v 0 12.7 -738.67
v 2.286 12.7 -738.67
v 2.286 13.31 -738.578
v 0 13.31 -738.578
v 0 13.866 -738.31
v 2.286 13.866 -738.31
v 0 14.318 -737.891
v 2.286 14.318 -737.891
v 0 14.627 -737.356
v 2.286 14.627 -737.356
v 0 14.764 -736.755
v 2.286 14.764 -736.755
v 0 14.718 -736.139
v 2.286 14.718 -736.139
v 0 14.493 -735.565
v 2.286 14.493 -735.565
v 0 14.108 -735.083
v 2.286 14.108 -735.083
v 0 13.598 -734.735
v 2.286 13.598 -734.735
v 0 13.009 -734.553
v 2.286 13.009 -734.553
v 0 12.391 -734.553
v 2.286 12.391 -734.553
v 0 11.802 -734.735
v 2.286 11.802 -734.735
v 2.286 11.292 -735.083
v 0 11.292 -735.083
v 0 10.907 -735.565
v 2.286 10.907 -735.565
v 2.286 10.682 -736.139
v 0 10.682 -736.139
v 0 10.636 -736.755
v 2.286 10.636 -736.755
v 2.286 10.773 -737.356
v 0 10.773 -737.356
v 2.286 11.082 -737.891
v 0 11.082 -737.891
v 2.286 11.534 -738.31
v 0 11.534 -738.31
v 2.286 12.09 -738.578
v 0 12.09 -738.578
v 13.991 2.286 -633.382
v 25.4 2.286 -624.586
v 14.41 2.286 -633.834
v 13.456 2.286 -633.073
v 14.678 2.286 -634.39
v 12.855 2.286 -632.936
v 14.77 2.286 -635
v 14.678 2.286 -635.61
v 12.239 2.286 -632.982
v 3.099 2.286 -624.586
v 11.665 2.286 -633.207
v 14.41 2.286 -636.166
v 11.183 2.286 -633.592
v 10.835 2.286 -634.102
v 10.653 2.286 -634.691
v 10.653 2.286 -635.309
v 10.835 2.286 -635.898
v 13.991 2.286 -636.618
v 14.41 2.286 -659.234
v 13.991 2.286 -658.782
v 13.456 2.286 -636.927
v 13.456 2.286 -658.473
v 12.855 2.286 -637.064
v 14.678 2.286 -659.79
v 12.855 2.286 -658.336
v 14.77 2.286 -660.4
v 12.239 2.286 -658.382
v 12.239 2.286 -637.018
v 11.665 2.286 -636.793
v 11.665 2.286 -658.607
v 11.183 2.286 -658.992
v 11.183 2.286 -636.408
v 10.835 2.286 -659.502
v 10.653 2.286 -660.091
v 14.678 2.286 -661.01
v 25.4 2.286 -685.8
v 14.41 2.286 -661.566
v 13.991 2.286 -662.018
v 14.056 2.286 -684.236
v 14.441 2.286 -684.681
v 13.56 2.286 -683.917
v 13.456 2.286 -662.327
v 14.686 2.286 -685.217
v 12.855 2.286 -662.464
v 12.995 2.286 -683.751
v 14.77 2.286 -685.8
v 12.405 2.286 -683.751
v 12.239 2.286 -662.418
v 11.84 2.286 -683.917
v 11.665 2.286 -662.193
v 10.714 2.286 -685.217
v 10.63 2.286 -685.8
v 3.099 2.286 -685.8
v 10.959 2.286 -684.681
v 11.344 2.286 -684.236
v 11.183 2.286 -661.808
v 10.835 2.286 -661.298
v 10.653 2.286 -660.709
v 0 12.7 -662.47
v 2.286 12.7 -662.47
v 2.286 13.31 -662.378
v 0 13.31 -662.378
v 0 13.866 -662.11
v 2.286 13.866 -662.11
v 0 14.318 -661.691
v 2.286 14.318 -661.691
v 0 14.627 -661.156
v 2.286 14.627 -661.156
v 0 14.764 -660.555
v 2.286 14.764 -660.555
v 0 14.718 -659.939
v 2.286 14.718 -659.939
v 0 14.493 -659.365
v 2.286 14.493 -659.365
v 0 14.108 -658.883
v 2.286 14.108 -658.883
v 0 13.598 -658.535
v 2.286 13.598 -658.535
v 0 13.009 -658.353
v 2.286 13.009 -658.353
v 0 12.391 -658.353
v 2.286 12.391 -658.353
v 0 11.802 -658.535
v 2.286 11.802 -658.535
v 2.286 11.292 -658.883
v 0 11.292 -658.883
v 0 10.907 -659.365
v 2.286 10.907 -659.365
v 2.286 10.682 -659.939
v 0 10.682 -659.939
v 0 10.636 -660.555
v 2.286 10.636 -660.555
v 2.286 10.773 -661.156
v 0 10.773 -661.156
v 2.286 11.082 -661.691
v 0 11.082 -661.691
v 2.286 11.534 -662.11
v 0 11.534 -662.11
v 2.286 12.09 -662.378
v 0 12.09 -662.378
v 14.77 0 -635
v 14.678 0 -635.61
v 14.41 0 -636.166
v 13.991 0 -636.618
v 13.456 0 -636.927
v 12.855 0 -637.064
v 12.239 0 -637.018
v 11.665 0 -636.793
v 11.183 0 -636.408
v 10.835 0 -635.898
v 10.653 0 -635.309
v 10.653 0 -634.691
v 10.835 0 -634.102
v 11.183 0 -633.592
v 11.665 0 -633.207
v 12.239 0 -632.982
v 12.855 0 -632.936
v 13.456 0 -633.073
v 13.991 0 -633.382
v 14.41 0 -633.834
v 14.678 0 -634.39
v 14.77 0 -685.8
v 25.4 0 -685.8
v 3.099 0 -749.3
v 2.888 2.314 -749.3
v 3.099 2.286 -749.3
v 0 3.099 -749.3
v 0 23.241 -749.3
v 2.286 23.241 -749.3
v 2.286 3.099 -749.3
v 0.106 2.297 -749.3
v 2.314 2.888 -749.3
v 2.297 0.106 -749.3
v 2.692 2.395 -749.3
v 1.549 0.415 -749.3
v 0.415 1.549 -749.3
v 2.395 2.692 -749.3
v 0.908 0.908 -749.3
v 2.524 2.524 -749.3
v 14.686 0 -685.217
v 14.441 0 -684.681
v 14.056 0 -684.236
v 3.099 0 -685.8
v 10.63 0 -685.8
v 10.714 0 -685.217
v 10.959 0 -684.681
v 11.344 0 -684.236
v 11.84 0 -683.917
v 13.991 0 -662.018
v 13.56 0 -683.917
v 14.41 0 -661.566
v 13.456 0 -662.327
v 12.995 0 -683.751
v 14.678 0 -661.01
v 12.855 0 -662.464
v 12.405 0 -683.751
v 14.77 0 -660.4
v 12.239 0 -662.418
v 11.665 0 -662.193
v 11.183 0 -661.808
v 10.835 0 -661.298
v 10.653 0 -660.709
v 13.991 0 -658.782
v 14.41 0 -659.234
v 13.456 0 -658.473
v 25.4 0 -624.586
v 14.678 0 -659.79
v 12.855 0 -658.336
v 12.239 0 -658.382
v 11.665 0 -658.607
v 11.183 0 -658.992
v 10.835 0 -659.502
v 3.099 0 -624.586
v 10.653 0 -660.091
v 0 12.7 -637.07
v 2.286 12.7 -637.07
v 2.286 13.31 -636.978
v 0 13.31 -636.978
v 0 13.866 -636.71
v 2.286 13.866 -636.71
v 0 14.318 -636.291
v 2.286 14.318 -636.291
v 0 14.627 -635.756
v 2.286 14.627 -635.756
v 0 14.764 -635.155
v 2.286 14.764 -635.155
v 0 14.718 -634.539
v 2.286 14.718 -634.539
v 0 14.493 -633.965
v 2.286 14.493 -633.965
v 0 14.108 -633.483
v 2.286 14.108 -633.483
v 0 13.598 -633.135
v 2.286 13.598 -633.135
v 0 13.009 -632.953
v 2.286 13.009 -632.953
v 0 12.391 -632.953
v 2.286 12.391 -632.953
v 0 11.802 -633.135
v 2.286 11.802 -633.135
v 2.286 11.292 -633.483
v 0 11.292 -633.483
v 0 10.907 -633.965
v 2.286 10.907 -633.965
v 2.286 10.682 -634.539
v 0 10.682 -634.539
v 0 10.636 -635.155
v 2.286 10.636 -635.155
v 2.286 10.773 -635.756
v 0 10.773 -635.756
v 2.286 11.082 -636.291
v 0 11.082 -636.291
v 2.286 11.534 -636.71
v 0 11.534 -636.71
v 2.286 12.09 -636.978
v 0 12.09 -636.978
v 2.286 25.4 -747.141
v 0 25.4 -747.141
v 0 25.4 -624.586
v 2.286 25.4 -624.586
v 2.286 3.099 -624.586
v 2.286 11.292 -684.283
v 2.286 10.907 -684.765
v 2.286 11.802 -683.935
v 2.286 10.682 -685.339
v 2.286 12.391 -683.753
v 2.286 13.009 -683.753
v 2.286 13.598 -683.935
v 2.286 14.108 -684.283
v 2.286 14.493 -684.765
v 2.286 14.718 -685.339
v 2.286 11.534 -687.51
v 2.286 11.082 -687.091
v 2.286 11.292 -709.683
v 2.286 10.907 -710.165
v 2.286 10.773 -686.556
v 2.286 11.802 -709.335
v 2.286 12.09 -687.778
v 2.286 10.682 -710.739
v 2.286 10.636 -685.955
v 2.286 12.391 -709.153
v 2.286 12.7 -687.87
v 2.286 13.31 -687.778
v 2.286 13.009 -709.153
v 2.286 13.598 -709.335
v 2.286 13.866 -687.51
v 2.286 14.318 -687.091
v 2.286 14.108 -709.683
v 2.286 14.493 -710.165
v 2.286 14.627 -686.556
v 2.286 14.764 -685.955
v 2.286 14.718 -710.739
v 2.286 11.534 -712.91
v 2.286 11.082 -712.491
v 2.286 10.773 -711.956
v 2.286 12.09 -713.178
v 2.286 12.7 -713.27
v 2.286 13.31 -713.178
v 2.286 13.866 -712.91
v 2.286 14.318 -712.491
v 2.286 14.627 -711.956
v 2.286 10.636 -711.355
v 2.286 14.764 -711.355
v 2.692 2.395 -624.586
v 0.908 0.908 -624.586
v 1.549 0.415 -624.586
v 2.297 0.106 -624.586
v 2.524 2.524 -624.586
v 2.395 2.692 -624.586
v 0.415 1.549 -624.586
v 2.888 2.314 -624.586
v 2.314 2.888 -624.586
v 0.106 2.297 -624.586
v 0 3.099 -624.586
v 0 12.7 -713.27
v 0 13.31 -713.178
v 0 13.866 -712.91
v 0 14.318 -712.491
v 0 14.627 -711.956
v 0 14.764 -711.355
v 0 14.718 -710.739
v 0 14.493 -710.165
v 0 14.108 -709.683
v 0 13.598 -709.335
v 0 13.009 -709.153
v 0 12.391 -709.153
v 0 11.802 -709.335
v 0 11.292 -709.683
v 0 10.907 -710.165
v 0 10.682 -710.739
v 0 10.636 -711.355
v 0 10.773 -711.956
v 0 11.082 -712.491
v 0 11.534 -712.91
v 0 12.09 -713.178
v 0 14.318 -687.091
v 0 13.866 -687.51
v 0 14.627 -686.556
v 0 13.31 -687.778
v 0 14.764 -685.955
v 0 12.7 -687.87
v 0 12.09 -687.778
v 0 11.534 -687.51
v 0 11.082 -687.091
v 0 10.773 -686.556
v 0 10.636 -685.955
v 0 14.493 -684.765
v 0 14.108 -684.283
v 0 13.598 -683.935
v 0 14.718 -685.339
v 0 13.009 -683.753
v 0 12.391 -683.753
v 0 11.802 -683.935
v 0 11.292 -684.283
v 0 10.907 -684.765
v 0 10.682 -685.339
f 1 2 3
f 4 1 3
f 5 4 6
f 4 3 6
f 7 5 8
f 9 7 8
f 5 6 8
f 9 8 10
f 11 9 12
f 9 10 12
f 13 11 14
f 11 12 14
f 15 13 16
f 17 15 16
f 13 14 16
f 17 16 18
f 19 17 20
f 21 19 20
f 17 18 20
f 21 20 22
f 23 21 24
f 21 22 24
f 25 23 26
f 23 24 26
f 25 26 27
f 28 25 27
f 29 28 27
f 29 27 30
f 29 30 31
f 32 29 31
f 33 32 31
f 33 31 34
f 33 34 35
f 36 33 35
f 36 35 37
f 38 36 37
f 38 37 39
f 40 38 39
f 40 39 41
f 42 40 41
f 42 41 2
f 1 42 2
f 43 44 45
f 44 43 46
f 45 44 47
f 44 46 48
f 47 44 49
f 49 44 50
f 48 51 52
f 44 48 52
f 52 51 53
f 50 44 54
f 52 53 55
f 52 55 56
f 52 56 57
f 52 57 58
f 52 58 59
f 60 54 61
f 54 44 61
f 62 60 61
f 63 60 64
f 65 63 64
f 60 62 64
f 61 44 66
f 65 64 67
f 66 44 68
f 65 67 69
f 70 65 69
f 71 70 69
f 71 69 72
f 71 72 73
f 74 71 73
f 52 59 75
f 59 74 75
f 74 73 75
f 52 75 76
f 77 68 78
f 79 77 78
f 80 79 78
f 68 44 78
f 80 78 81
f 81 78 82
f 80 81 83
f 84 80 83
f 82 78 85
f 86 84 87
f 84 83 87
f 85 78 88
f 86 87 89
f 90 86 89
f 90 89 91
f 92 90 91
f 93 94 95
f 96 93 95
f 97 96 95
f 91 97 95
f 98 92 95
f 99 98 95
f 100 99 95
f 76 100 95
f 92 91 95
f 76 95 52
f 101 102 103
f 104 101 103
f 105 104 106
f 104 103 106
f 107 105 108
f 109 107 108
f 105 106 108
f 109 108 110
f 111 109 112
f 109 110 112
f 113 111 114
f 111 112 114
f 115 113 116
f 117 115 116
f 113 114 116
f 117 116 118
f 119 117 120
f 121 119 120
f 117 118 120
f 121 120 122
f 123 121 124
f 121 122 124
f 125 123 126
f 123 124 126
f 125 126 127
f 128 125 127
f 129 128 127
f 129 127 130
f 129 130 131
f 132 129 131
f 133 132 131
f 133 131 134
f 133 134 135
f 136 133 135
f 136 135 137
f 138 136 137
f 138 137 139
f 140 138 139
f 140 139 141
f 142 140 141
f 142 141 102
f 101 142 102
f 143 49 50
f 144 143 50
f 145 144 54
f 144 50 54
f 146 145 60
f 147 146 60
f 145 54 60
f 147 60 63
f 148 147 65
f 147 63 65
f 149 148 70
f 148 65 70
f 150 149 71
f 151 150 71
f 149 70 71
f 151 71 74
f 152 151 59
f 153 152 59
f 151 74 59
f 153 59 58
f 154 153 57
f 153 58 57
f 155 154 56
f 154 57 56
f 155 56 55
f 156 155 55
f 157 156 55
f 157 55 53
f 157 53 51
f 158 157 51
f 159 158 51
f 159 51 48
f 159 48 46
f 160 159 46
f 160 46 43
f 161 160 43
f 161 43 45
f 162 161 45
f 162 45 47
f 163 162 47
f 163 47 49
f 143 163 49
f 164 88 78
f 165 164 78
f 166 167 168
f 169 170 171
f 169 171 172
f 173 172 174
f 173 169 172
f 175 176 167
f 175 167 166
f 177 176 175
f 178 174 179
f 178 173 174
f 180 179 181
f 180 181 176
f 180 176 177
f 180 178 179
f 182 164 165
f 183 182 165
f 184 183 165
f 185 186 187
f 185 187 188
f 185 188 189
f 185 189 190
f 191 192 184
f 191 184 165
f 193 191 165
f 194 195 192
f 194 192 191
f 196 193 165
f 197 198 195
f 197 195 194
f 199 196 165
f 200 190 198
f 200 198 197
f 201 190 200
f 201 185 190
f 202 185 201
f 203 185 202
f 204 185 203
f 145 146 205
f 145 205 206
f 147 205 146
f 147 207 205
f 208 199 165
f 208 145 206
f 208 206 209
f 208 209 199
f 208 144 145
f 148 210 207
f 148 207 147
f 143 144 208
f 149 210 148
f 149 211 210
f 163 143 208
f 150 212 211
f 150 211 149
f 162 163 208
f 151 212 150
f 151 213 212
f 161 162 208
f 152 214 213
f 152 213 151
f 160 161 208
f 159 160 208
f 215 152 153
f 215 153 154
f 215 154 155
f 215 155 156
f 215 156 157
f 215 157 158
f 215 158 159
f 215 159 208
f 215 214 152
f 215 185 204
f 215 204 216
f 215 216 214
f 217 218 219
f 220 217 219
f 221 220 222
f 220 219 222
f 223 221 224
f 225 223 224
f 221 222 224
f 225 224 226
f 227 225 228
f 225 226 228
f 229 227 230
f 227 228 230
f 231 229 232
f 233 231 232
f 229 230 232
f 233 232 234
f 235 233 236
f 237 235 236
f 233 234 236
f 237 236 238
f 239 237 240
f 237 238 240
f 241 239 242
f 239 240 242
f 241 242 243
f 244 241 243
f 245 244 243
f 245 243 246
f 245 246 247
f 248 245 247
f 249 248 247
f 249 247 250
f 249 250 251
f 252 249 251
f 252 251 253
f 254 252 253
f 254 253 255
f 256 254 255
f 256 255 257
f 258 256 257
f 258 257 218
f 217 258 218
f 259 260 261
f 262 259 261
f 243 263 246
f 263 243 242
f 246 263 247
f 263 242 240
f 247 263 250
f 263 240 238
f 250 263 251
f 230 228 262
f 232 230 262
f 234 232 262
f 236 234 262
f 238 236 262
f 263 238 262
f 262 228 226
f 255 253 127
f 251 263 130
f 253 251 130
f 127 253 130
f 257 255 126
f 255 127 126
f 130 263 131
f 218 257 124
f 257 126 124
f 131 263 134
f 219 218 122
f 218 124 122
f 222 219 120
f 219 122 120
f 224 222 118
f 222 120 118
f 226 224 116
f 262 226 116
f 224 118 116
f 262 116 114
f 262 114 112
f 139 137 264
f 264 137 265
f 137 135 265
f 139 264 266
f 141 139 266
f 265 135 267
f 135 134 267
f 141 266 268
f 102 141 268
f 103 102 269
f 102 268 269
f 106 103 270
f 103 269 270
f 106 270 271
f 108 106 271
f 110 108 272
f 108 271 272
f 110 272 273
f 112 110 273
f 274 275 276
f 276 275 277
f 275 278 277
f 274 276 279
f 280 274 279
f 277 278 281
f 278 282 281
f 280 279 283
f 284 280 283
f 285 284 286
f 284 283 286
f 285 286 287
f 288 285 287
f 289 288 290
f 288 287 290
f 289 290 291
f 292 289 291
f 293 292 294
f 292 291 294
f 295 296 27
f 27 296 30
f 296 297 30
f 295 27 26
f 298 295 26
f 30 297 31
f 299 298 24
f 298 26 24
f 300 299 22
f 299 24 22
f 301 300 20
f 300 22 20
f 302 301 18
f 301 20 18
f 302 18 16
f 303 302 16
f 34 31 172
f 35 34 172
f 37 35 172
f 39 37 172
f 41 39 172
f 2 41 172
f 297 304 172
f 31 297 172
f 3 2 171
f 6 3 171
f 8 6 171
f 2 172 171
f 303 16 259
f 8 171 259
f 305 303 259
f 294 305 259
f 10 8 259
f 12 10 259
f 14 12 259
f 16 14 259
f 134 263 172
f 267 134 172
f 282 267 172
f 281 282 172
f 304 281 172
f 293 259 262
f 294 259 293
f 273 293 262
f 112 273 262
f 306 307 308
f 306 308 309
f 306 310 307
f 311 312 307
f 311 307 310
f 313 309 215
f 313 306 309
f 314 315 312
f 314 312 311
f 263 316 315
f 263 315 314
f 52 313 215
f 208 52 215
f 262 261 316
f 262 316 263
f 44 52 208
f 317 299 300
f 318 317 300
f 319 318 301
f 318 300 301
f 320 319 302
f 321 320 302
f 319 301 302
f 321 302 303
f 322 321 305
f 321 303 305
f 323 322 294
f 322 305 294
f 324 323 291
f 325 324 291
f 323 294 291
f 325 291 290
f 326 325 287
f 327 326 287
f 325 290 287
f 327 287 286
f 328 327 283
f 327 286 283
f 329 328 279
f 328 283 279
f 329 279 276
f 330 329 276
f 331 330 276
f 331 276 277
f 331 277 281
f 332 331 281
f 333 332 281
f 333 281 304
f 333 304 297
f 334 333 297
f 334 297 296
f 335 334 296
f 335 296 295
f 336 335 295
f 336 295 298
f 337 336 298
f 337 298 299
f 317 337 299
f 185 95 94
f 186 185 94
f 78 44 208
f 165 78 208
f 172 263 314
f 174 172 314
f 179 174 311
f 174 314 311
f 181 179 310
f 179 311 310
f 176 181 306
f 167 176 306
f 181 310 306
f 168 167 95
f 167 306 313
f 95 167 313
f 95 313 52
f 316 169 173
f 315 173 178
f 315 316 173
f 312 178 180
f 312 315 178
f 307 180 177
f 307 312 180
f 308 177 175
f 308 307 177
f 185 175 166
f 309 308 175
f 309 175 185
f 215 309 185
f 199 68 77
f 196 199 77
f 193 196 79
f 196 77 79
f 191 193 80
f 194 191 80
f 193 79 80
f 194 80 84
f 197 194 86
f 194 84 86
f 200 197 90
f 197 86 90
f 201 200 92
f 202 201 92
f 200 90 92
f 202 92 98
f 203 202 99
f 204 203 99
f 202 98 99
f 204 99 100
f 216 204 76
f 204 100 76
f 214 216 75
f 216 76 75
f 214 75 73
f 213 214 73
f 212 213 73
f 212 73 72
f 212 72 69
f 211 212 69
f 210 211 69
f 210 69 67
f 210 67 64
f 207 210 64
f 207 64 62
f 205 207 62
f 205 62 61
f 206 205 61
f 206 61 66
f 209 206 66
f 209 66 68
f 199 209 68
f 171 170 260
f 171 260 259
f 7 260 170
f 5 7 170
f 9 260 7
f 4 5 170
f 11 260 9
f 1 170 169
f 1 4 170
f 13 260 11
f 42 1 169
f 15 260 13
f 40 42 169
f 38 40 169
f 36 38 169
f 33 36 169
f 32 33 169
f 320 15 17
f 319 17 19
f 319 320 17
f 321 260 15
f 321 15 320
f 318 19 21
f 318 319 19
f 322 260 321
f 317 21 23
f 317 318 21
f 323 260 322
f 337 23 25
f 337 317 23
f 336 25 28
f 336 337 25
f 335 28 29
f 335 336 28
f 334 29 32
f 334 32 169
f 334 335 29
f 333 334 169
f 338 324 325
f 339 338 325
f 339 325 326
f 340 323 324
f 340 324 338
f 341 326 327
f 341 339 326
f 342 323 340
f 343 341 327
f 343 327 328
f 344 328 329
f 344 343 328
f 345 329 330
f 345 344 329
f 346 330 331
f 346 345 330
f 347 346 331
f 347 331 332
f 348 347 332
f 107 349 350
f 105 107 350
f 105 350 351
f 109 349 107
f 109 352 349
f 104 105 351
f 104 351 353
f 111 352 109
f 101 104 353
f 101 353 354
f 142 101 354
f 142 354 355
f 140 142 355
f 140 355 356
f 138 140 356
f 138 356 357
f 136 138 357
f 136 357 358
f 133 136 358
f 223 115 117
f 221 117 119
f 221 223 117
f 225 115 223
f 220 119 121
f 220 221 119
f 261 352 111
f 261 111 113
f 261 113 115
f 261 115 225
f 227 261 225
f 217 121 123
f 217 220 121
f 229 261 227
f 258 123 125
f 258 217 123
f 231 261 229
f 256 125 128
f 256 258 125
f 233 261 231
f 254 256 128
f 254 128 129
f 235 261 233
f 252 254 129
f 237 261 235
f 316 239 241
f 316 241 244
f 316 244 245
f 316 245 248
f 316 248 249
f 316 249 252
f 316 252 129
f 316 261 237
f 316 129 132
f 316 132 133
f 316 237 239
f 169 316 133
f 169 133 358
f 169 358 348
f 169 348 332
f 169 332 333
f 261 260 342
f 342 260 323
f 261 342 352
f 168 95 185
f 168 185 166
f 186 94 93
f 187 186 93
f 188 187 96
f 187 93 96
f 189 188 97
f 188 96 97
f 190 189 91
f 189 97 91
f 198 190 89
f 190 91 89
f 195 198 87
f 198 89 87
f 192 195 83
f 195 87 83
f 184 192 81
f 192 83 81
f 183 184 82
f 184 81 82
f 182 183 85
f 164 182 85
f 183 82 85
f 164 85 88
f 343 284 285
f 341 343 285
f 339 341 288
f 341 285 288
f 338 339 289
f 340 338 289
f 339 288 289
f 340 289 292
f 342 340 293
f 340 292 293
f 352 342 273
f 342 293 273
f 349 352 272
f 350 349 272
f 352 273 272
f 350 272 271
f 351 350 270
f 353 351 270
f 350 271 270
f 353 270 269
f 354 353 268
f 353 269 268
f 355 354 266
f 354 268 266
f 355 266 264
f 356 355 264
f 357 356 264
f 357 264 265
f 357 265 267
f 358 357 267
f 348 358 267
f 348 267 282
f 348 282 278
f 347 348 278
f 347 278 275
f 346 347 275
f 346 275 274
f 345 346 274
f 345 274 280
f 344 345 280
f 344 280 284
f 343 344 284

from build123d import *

# Parameters (mm, degrees)
SKETCH1_W                  = 25.4
SKETCH1_H                  = 1498.6
BOSS_EXTRUDE1_DEPTH        = 25.4
SKETCH2_W                  = 23.114
SKETCH2_H                  = 23.114
CUT_EXTRUDE1_DEPTH         = 1499.6
M3_5_CLEARANCE_HOLE1_D     = 4.1402
M3_5_CLEARANCE_HOLE1_DEPTH = 25.4
M3_5_CLEARANCE_HOLE2_D     = 4.1402
M3_5_CLEARANCE_HOLE2_DEPTH = 25.4
CHAMFER1_SIZE              = 2.159
FILLET1_R                  = 0.8128
FILLET2_R                  = 3.0988
SKETCH8_W                  = 95.882963774
SKETCH8_H                  = 79.338329604
CUT_EXTRUDE3_DEPTH         = 1371.6
SKETCH11_W                 = 51.462522779
SKETCH11_H                 = 66.676735099
CUT_EXTRUDE6_DEPTH         = 2.286
SKETCH12_W                 = 24.634530663
SKETCH12_H                 = 66.668992962
CUT_EXTRUDE7_DEPTH         = 2.54


with BuildPart() as part:
    # Sketch1 → Boss-Extrude1 (new body)
    with BuildSketch(Plane(origin=(0, 0, 0), x_dir=(0, -1, 0), z_dir=(-1, 0, 0))):
        with Locations((-12.7, 0)):
            Rectangle(SKETCH1_W, SKETCH1_H)
    extrude(amount=-BOSS_EXTRUDE1_DEPTH)

    # Sketch2 → Cut-Extrude1 (cut, through all)
    with BuildSketch(Plane(origin=(0, 0, -749.3), x_dir=(-1, 0, 0), z_dir=(0, 0, -1))):
        with Locations((-13.843, 13.843)):
            Rectangle(SKETCH2_W, SKETCH2_H)
    extrude(amount=-CUT_EXTRUDE1_DEPTH, mode=Mode.SUBTRACT)

    # M3.5 Clearance Hole1
    with Locations(Plane(origin=(0, 0, 0), x_dir=(-1, 0, 0), z_dir=(0, -1, 0))):
        with Locations((-12.7, 736.6), (-12.7, 711.2), (-12.7, 685.8), (-12.7, 660.4), (-12.7, 635), (-12.7, 609.6), (-12.7, 584.2), (-12.7, 558.8), (-12.7, 533.4), (-12.7, 508), (-12.7, 482.6), (-12.7, 457.2), (-12.7, 431.8), (-12.7, 406.4), (-12.7, 381), (-12.7, 355.6), (-12.7, 330.2), (-12.7, 304.8), (-12.7, 279.4), (-12.7, 254), (-12.7, 228.6), (-12.7, 203.2), (-12.7, 177.8), (-12.7, 152.4), (-12.7, 127), (-12.7, 101.6), (-12.7, 76.2), (-12.7, 50.8), (-12.7, 25.4), (-12.7, 0), (-12.7, -25.4), (-12.7, -50.8), (-12.7, -76.2), (-12.7, -101.6), (-12.7, -127), (-12.7, -152.4), (-12.7, -177.8), (-12.7, -203.2), (-12.7, -228.6), (-12.7, -254), (-12.7, -279.4), (-12.7, -304.8), (-12.7, -330.2), (-12.7, -355.6), (-12.7, -381), (-12.7, -406.4), (-12.7, -431.8), (-12.7, -457.2), (-12.7, -482.6), (-12.7, -508), (-12.7, -533.4), (-12.7, -558.8), (-12.7, -584.2), (-12.7, -609.6), (-12.7, -635), (-12.7, -660.4), (-12.7, -685.8), (-12.7, -711.2), (-12.7, -736.6)):
            Hole(M3_5_CLEARANCE_HOLE1_D / 2, depth=M3_5_CLEARANCE_HOLE1_DEPTH)

    # M3.5 Clearance Hole2
    with Locations(Plane.ZY):
        with Locations((711.2, 12.7), (736.6, 12.7), (685.8, 12.7), (660.4, 12.7), (635, 12.7), (609.6, 12.7), (584.2, 12.7), (558.8, 12.7), (533.4, 12.7), (508, 12.7), (482.6, 12.7), (457.2, 12.7), (431.8, 12.7), (406.4, 12.7), (381, 12.7), (355.6, 12.7), (330.2, 12.7), (304.8, 12.7), (279.4, 12.7), (254, 12.7), (228.6, 12.7), (203.2, 12.7), (177.8, 12.7), (152.4, 12.7), (127, 12.7), (101.6, 12.7), (76.2, 12.7), (50.8, 12.7), (25.4, 12.7), (0, 12.7), (-25.4, 12.7), (-50.8, 12.7), (-76.2, 12.7), (-101.6, 12.7), (-127, 12.7), (-152.4, 12.7), (-177.8, 12.7), (-203.2, 12.7), (-228.6, 12.7), (-254, 12.7), (-279.4, 12.7), (-304.8, 12.7), (-330.2, 12.7), (-355.6, 12.7), (-381, 12.7), (-406.4, 12.7), (-431.8, 12.7), (-457.2, 12.7), (-482.6, 12.7), (-508, 12.7), (-533.4, 12.7), (-558.8, 12.7), (-584.2, 12.7), (-609.6, 12.7), (-635, 12.7), (-660.4, 12.7), (-685.8, 12.7), (-711.2, 12.7), (-736.6, 12.7)):
            Hole(M3_5_CLEARANCE_HOLE2_D / 2, depth=M3_5_CLEARANCE_HOLE2_DEPTH)

    # Chamfer1
    chamfer1_edges = [part.edges().sort_by_distance(p)[0] for p in [
        (25.4, 1.143, -749.3),
        (1.143, 25.4, 749.3),
        (1.143, 25.4, -749.3),
        (25.4, 1.143, 749.3),
    ]]
    chamfer(chamfer1_edges, length=CHAMFER1_SIZE)

    # Fillet1
    fillet1_edges = [part.edges().sort_by_distance(p)[0] for p in [
        (2.286, 2.286, 0),
    ]]
    fillet(fillet1_edges, radius=FILLET1_R)

    # Fillet2
    fillet2_edges = [part.edges().sort_by_distance(p)[0] for p in [
        (0, 0, 0),
    ]]
    fillet(fillet2_edges, radius=FILLET2_R)

    # Sketch8 → Cut-Extrude3 (cut)
    with BuildSketch(Plane.XY.offset(749.3)):
        with Locations((2.286, 3.0988)):
            Rectangle(SKETCH8_W, SKETCH8_H)
    extrude(amount=-CUT_EXTRUDE3_DEPTH, mode=Mode.SUBTRACT)

    # Sketch11 → Cut-Extrude6 (cut)
    with BuildSketch(Plane.XY.offset(-622.3)):
        with Locations((1.85517497, 1.74884985)):
            Rectangle(SKETCH11_W, SKETCH11_H)
    extrude(amount=-CUT_EXTRUDE6_DEPTH, mode=Mode.SUBTRACT)

    # Sketch12 → Cut-Extrude7 (cut)
    with BuildSketch(Plane(origin=(0, 2.286, 0), x_dir=(1, 0, 0), z_dir=(0, 1, 0))):
        with Locations((15.416065332, 719.134496481)):
            Rectangle(SKETCH12_W, SKETCH12_H)
    extrude(amount=-CUT_EXTRUDE7_DEPTH, mode=Mode.SUBTRACT)


solid = part.part
